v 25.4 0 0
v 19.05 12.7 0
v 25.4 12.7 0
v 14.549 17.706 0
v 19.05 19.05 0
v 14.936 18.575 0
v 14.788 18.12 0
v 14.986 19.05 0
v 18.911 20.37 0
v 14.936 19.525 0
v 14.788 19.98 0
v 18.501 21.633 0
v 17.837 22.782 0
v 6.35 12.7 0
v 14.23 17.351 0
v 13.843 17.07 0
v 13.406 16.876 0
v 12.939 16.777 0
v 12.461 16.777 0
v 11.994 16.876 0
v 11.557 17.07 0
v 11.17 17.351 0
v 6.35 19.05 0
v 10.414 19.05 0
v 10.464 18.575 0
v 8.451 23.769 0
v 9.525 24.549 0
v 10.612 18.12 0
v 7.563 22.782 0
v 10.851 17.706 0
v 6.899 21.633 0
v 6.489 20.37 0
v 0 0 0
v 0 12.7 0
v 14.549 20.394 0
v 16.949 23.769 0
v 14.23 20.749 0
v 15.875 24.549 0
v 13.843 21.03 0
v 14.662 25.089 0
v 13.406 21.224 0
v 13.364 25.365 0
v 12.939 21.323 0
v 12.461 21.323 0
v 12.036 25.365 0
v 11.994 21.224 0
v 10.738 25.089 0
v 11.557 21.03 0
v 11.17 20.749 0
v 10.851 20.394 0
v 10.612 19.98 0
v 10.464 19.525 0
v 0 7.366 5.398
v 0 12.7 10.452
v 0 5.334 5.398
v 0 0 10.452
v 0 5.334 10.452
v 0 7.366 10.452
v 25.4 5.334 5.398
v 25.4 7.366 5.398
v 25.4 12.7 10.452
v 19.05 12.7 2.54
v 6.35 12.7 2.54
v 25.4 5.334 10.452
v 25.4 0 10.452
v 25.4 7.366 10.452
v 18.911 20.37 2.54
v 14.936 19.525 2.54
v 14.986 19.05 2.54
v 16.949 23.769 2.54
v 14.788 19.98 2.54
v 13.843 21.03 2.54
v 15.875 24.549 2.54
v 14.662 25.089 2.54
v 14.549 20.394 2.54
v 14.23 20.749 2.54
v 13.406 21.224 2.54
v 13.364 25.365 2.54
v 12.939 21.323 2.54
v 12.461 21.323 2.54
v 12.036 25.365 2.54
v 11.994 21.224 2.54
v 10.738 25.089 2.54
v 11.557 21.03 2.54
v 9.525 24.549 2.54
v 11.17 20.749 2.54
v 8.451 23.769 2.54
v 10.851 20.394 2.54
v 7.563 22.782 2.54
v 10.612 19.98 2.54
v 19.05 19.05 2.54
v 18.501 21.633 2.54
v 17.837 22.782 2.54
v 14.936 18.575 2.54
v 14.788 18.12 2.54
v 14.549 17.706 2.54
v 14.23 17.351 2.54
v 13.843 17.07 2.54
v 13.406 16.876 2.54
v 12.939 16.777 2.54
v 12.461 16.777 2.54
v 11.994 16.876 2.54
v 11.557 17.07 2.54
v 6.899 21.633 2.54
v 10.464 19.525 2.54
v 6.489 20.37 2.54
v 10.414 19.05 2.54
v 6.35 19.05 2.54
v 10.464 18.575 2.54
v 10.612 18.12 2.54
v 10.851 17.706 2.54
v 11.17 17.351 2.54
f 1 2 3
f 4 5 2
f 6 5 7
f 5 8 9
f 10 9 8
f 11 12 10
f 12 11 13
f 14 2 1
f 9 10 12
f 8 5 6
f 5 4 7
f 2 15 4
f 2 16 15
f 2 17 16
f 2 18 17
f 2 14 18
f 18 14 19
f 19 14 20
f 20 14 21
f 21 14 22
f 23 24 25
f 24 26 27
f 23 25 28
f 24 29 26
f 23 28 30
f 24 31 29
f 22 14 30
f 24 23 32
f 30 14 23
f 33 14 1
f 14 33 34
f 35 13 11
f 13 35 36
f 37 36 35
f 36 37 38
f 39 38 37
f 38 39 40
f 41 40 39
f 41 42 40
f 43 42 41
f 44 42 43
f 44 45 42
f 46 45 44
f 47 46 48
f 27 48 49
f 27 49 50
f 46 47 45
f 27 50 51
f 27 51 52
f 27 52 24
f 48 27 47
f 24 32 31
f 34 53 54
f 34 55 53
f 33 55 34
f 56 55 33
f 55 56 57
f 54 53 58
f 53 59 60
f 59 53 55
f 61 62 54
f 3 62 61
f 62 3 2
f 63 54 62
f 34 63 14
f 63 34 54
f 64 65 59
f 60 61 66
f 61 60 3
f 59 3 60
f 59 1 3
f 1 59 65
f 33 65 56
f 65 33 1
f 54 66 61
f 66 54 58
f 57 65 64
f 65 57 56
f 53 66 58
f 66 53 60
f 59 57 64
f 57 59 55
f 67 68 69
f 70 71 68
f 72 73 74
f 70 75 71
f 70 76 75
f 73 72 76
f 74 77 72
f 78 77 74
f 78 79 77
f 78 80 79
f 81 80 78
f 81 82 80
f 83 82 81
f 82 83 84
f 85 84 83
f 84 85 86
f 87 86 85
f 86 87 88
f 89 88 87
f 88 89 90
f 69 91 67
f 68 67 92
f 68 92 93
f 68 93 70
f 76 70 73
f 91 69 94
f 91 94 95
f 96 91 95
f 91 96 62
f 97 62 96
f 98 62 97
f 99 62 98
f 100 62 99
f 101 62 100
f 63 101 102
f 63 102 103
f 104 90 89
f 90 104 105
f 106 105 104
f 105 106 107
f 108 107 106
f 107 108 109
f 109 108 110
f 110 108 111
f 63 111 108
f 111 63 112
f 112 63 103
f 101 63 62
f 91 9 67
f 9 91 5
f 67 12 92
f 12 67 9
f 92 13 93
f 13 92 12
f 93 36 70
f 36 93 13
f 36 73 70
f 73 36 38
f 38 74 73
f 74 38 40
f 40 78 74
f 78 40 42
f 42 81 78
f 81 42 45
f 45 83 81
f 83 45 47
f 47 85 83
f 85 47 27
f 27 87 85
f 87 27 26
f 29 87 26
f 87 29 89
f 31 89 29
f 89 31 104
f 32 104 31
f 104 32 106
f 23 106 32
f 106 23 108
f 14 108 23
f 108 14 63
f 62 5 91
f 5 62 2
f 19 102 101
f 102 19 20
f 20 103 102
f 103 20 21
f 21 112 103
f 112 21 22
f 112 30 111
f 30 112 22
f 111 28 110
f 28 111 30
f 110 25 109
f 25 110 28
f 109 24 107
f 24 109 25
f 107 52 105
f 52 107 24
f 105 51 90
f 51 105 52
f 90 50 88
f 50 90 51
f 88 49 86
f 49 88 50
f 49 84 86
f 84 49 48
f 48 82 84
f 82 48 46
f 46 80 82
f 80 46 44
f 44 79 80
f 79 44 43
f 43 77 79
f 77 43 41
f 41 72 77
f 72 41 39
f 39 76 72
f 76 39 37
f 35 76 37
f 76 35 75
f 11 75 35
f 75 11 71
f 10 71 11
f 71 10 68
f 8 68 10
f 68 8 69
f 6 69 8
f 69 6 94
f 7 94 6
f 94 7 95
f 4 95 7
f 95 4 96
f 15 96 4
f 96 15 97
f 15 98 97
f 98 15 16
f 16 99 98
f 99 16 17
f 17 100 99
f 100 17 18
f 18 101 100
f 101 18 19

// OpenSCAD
// file: ../models/model_ws2812strip.scad
module model_ws2812strip(numleds = 1)
{
    for (ii = [0:1:numleds-1]) {
        echo(ii);
        translate([ii * 400, 0, 0]) {
        // Substrate
        if (modelcolor) color("white")
        linear_extrude(20)
        square([400, 473]);

        // LED
        if (modelcolor) color("beige")
        translate([100, 100, 19])
        linear_extrude(51)
        square([200, 200]);

        // Resistor
        if (modelcolor) color("tan")
        translate([150, 350, 19])
        linear_extrude(50)
        square([100, 30]);
        }

        if (modelcolor) {
            // Contacts
            color("gold")
            translate([0, 0, 20])
            linear_extrude(1) {
                for (ii=[120,240,360]) {
                    translate([360, ii, 0])
                    hull() {
                        circle(80/2);
                        translate([0, -40, 0])
                        square([40, 80]);
                    }
                }
                for (ii=[120,240,360]) {
                    translate([40, ii, 0])
                    rotate([0, 0, 180])
                    hull() {
                        circle(80/2);
                        translate([0, -40, 0])
                        square([40, 80]);
                    }
                }
            }

            // Outline
            color("black")
            translate([0, 0, 20])
            linear_extrude(1) 
            difference() {
                square([400, 473]);
                translate([5, 5, 0])
                square([390, 463]);
            }
        }
    }
}
// main file
ViewScale = [0.0254, 0.0254, 0.0254];

include <../models/model_ws2812strip.scad>

model_lip = function() [50,350];
modelcolor = 1;

module ws2812strip_insert()
{
    difference() {
        projection() {
            translate([473, 0, 0])
            rotate([0, 270, 90])
            scale([1.0, 1.1, 2.0])
            model_ws2812strip();
        }
    }
}

module ws2812clip()
{
    difference() {
        square([401, 200]);
        translate([0, 150, 0])
        rotate([0, 0, -90])
        square(model_lip());
    }
    translate([400, 0, 0])
    rotate([0, 0, 15])
    difference() {
        square([573, 120]);
        translate([75, 50, 0])
        scale([1.0, -1.0, 1.0])
        ws2812strip_insert();
        translate([80, 70, 0])
        square([400, 50]);
    }
}

//pcb 12 1/4
//box 12 7/8


module sideclip()
{
    linear_extrude(625/2-100)
    square([1000, 500]);
    translate([0, 0, 625/2-101])
    linear_extrude(200)
    difference() {
        square([1000, 500]);
        translate([0, 250-40, 0])
        square([1000, 80]);

    }

    // Screw mount
    translate([500, 750, 0])
    linear_extrude(100)
    difference() {
        hull() {
            circle(500/2);
            translate([-250, -500, 0])
            square([500, 500]);
        }
        circle(180/2);
    }

}

module forViewing()
{
//    model_ws2812strip();
//    ws2812clip();
    sideclip();
}

module forPrinting()
{
    linear_extrude(300)
    ws2812clip();
}

scale(ViewScale)
{
//    forPrinting();
    forViewing();
}
